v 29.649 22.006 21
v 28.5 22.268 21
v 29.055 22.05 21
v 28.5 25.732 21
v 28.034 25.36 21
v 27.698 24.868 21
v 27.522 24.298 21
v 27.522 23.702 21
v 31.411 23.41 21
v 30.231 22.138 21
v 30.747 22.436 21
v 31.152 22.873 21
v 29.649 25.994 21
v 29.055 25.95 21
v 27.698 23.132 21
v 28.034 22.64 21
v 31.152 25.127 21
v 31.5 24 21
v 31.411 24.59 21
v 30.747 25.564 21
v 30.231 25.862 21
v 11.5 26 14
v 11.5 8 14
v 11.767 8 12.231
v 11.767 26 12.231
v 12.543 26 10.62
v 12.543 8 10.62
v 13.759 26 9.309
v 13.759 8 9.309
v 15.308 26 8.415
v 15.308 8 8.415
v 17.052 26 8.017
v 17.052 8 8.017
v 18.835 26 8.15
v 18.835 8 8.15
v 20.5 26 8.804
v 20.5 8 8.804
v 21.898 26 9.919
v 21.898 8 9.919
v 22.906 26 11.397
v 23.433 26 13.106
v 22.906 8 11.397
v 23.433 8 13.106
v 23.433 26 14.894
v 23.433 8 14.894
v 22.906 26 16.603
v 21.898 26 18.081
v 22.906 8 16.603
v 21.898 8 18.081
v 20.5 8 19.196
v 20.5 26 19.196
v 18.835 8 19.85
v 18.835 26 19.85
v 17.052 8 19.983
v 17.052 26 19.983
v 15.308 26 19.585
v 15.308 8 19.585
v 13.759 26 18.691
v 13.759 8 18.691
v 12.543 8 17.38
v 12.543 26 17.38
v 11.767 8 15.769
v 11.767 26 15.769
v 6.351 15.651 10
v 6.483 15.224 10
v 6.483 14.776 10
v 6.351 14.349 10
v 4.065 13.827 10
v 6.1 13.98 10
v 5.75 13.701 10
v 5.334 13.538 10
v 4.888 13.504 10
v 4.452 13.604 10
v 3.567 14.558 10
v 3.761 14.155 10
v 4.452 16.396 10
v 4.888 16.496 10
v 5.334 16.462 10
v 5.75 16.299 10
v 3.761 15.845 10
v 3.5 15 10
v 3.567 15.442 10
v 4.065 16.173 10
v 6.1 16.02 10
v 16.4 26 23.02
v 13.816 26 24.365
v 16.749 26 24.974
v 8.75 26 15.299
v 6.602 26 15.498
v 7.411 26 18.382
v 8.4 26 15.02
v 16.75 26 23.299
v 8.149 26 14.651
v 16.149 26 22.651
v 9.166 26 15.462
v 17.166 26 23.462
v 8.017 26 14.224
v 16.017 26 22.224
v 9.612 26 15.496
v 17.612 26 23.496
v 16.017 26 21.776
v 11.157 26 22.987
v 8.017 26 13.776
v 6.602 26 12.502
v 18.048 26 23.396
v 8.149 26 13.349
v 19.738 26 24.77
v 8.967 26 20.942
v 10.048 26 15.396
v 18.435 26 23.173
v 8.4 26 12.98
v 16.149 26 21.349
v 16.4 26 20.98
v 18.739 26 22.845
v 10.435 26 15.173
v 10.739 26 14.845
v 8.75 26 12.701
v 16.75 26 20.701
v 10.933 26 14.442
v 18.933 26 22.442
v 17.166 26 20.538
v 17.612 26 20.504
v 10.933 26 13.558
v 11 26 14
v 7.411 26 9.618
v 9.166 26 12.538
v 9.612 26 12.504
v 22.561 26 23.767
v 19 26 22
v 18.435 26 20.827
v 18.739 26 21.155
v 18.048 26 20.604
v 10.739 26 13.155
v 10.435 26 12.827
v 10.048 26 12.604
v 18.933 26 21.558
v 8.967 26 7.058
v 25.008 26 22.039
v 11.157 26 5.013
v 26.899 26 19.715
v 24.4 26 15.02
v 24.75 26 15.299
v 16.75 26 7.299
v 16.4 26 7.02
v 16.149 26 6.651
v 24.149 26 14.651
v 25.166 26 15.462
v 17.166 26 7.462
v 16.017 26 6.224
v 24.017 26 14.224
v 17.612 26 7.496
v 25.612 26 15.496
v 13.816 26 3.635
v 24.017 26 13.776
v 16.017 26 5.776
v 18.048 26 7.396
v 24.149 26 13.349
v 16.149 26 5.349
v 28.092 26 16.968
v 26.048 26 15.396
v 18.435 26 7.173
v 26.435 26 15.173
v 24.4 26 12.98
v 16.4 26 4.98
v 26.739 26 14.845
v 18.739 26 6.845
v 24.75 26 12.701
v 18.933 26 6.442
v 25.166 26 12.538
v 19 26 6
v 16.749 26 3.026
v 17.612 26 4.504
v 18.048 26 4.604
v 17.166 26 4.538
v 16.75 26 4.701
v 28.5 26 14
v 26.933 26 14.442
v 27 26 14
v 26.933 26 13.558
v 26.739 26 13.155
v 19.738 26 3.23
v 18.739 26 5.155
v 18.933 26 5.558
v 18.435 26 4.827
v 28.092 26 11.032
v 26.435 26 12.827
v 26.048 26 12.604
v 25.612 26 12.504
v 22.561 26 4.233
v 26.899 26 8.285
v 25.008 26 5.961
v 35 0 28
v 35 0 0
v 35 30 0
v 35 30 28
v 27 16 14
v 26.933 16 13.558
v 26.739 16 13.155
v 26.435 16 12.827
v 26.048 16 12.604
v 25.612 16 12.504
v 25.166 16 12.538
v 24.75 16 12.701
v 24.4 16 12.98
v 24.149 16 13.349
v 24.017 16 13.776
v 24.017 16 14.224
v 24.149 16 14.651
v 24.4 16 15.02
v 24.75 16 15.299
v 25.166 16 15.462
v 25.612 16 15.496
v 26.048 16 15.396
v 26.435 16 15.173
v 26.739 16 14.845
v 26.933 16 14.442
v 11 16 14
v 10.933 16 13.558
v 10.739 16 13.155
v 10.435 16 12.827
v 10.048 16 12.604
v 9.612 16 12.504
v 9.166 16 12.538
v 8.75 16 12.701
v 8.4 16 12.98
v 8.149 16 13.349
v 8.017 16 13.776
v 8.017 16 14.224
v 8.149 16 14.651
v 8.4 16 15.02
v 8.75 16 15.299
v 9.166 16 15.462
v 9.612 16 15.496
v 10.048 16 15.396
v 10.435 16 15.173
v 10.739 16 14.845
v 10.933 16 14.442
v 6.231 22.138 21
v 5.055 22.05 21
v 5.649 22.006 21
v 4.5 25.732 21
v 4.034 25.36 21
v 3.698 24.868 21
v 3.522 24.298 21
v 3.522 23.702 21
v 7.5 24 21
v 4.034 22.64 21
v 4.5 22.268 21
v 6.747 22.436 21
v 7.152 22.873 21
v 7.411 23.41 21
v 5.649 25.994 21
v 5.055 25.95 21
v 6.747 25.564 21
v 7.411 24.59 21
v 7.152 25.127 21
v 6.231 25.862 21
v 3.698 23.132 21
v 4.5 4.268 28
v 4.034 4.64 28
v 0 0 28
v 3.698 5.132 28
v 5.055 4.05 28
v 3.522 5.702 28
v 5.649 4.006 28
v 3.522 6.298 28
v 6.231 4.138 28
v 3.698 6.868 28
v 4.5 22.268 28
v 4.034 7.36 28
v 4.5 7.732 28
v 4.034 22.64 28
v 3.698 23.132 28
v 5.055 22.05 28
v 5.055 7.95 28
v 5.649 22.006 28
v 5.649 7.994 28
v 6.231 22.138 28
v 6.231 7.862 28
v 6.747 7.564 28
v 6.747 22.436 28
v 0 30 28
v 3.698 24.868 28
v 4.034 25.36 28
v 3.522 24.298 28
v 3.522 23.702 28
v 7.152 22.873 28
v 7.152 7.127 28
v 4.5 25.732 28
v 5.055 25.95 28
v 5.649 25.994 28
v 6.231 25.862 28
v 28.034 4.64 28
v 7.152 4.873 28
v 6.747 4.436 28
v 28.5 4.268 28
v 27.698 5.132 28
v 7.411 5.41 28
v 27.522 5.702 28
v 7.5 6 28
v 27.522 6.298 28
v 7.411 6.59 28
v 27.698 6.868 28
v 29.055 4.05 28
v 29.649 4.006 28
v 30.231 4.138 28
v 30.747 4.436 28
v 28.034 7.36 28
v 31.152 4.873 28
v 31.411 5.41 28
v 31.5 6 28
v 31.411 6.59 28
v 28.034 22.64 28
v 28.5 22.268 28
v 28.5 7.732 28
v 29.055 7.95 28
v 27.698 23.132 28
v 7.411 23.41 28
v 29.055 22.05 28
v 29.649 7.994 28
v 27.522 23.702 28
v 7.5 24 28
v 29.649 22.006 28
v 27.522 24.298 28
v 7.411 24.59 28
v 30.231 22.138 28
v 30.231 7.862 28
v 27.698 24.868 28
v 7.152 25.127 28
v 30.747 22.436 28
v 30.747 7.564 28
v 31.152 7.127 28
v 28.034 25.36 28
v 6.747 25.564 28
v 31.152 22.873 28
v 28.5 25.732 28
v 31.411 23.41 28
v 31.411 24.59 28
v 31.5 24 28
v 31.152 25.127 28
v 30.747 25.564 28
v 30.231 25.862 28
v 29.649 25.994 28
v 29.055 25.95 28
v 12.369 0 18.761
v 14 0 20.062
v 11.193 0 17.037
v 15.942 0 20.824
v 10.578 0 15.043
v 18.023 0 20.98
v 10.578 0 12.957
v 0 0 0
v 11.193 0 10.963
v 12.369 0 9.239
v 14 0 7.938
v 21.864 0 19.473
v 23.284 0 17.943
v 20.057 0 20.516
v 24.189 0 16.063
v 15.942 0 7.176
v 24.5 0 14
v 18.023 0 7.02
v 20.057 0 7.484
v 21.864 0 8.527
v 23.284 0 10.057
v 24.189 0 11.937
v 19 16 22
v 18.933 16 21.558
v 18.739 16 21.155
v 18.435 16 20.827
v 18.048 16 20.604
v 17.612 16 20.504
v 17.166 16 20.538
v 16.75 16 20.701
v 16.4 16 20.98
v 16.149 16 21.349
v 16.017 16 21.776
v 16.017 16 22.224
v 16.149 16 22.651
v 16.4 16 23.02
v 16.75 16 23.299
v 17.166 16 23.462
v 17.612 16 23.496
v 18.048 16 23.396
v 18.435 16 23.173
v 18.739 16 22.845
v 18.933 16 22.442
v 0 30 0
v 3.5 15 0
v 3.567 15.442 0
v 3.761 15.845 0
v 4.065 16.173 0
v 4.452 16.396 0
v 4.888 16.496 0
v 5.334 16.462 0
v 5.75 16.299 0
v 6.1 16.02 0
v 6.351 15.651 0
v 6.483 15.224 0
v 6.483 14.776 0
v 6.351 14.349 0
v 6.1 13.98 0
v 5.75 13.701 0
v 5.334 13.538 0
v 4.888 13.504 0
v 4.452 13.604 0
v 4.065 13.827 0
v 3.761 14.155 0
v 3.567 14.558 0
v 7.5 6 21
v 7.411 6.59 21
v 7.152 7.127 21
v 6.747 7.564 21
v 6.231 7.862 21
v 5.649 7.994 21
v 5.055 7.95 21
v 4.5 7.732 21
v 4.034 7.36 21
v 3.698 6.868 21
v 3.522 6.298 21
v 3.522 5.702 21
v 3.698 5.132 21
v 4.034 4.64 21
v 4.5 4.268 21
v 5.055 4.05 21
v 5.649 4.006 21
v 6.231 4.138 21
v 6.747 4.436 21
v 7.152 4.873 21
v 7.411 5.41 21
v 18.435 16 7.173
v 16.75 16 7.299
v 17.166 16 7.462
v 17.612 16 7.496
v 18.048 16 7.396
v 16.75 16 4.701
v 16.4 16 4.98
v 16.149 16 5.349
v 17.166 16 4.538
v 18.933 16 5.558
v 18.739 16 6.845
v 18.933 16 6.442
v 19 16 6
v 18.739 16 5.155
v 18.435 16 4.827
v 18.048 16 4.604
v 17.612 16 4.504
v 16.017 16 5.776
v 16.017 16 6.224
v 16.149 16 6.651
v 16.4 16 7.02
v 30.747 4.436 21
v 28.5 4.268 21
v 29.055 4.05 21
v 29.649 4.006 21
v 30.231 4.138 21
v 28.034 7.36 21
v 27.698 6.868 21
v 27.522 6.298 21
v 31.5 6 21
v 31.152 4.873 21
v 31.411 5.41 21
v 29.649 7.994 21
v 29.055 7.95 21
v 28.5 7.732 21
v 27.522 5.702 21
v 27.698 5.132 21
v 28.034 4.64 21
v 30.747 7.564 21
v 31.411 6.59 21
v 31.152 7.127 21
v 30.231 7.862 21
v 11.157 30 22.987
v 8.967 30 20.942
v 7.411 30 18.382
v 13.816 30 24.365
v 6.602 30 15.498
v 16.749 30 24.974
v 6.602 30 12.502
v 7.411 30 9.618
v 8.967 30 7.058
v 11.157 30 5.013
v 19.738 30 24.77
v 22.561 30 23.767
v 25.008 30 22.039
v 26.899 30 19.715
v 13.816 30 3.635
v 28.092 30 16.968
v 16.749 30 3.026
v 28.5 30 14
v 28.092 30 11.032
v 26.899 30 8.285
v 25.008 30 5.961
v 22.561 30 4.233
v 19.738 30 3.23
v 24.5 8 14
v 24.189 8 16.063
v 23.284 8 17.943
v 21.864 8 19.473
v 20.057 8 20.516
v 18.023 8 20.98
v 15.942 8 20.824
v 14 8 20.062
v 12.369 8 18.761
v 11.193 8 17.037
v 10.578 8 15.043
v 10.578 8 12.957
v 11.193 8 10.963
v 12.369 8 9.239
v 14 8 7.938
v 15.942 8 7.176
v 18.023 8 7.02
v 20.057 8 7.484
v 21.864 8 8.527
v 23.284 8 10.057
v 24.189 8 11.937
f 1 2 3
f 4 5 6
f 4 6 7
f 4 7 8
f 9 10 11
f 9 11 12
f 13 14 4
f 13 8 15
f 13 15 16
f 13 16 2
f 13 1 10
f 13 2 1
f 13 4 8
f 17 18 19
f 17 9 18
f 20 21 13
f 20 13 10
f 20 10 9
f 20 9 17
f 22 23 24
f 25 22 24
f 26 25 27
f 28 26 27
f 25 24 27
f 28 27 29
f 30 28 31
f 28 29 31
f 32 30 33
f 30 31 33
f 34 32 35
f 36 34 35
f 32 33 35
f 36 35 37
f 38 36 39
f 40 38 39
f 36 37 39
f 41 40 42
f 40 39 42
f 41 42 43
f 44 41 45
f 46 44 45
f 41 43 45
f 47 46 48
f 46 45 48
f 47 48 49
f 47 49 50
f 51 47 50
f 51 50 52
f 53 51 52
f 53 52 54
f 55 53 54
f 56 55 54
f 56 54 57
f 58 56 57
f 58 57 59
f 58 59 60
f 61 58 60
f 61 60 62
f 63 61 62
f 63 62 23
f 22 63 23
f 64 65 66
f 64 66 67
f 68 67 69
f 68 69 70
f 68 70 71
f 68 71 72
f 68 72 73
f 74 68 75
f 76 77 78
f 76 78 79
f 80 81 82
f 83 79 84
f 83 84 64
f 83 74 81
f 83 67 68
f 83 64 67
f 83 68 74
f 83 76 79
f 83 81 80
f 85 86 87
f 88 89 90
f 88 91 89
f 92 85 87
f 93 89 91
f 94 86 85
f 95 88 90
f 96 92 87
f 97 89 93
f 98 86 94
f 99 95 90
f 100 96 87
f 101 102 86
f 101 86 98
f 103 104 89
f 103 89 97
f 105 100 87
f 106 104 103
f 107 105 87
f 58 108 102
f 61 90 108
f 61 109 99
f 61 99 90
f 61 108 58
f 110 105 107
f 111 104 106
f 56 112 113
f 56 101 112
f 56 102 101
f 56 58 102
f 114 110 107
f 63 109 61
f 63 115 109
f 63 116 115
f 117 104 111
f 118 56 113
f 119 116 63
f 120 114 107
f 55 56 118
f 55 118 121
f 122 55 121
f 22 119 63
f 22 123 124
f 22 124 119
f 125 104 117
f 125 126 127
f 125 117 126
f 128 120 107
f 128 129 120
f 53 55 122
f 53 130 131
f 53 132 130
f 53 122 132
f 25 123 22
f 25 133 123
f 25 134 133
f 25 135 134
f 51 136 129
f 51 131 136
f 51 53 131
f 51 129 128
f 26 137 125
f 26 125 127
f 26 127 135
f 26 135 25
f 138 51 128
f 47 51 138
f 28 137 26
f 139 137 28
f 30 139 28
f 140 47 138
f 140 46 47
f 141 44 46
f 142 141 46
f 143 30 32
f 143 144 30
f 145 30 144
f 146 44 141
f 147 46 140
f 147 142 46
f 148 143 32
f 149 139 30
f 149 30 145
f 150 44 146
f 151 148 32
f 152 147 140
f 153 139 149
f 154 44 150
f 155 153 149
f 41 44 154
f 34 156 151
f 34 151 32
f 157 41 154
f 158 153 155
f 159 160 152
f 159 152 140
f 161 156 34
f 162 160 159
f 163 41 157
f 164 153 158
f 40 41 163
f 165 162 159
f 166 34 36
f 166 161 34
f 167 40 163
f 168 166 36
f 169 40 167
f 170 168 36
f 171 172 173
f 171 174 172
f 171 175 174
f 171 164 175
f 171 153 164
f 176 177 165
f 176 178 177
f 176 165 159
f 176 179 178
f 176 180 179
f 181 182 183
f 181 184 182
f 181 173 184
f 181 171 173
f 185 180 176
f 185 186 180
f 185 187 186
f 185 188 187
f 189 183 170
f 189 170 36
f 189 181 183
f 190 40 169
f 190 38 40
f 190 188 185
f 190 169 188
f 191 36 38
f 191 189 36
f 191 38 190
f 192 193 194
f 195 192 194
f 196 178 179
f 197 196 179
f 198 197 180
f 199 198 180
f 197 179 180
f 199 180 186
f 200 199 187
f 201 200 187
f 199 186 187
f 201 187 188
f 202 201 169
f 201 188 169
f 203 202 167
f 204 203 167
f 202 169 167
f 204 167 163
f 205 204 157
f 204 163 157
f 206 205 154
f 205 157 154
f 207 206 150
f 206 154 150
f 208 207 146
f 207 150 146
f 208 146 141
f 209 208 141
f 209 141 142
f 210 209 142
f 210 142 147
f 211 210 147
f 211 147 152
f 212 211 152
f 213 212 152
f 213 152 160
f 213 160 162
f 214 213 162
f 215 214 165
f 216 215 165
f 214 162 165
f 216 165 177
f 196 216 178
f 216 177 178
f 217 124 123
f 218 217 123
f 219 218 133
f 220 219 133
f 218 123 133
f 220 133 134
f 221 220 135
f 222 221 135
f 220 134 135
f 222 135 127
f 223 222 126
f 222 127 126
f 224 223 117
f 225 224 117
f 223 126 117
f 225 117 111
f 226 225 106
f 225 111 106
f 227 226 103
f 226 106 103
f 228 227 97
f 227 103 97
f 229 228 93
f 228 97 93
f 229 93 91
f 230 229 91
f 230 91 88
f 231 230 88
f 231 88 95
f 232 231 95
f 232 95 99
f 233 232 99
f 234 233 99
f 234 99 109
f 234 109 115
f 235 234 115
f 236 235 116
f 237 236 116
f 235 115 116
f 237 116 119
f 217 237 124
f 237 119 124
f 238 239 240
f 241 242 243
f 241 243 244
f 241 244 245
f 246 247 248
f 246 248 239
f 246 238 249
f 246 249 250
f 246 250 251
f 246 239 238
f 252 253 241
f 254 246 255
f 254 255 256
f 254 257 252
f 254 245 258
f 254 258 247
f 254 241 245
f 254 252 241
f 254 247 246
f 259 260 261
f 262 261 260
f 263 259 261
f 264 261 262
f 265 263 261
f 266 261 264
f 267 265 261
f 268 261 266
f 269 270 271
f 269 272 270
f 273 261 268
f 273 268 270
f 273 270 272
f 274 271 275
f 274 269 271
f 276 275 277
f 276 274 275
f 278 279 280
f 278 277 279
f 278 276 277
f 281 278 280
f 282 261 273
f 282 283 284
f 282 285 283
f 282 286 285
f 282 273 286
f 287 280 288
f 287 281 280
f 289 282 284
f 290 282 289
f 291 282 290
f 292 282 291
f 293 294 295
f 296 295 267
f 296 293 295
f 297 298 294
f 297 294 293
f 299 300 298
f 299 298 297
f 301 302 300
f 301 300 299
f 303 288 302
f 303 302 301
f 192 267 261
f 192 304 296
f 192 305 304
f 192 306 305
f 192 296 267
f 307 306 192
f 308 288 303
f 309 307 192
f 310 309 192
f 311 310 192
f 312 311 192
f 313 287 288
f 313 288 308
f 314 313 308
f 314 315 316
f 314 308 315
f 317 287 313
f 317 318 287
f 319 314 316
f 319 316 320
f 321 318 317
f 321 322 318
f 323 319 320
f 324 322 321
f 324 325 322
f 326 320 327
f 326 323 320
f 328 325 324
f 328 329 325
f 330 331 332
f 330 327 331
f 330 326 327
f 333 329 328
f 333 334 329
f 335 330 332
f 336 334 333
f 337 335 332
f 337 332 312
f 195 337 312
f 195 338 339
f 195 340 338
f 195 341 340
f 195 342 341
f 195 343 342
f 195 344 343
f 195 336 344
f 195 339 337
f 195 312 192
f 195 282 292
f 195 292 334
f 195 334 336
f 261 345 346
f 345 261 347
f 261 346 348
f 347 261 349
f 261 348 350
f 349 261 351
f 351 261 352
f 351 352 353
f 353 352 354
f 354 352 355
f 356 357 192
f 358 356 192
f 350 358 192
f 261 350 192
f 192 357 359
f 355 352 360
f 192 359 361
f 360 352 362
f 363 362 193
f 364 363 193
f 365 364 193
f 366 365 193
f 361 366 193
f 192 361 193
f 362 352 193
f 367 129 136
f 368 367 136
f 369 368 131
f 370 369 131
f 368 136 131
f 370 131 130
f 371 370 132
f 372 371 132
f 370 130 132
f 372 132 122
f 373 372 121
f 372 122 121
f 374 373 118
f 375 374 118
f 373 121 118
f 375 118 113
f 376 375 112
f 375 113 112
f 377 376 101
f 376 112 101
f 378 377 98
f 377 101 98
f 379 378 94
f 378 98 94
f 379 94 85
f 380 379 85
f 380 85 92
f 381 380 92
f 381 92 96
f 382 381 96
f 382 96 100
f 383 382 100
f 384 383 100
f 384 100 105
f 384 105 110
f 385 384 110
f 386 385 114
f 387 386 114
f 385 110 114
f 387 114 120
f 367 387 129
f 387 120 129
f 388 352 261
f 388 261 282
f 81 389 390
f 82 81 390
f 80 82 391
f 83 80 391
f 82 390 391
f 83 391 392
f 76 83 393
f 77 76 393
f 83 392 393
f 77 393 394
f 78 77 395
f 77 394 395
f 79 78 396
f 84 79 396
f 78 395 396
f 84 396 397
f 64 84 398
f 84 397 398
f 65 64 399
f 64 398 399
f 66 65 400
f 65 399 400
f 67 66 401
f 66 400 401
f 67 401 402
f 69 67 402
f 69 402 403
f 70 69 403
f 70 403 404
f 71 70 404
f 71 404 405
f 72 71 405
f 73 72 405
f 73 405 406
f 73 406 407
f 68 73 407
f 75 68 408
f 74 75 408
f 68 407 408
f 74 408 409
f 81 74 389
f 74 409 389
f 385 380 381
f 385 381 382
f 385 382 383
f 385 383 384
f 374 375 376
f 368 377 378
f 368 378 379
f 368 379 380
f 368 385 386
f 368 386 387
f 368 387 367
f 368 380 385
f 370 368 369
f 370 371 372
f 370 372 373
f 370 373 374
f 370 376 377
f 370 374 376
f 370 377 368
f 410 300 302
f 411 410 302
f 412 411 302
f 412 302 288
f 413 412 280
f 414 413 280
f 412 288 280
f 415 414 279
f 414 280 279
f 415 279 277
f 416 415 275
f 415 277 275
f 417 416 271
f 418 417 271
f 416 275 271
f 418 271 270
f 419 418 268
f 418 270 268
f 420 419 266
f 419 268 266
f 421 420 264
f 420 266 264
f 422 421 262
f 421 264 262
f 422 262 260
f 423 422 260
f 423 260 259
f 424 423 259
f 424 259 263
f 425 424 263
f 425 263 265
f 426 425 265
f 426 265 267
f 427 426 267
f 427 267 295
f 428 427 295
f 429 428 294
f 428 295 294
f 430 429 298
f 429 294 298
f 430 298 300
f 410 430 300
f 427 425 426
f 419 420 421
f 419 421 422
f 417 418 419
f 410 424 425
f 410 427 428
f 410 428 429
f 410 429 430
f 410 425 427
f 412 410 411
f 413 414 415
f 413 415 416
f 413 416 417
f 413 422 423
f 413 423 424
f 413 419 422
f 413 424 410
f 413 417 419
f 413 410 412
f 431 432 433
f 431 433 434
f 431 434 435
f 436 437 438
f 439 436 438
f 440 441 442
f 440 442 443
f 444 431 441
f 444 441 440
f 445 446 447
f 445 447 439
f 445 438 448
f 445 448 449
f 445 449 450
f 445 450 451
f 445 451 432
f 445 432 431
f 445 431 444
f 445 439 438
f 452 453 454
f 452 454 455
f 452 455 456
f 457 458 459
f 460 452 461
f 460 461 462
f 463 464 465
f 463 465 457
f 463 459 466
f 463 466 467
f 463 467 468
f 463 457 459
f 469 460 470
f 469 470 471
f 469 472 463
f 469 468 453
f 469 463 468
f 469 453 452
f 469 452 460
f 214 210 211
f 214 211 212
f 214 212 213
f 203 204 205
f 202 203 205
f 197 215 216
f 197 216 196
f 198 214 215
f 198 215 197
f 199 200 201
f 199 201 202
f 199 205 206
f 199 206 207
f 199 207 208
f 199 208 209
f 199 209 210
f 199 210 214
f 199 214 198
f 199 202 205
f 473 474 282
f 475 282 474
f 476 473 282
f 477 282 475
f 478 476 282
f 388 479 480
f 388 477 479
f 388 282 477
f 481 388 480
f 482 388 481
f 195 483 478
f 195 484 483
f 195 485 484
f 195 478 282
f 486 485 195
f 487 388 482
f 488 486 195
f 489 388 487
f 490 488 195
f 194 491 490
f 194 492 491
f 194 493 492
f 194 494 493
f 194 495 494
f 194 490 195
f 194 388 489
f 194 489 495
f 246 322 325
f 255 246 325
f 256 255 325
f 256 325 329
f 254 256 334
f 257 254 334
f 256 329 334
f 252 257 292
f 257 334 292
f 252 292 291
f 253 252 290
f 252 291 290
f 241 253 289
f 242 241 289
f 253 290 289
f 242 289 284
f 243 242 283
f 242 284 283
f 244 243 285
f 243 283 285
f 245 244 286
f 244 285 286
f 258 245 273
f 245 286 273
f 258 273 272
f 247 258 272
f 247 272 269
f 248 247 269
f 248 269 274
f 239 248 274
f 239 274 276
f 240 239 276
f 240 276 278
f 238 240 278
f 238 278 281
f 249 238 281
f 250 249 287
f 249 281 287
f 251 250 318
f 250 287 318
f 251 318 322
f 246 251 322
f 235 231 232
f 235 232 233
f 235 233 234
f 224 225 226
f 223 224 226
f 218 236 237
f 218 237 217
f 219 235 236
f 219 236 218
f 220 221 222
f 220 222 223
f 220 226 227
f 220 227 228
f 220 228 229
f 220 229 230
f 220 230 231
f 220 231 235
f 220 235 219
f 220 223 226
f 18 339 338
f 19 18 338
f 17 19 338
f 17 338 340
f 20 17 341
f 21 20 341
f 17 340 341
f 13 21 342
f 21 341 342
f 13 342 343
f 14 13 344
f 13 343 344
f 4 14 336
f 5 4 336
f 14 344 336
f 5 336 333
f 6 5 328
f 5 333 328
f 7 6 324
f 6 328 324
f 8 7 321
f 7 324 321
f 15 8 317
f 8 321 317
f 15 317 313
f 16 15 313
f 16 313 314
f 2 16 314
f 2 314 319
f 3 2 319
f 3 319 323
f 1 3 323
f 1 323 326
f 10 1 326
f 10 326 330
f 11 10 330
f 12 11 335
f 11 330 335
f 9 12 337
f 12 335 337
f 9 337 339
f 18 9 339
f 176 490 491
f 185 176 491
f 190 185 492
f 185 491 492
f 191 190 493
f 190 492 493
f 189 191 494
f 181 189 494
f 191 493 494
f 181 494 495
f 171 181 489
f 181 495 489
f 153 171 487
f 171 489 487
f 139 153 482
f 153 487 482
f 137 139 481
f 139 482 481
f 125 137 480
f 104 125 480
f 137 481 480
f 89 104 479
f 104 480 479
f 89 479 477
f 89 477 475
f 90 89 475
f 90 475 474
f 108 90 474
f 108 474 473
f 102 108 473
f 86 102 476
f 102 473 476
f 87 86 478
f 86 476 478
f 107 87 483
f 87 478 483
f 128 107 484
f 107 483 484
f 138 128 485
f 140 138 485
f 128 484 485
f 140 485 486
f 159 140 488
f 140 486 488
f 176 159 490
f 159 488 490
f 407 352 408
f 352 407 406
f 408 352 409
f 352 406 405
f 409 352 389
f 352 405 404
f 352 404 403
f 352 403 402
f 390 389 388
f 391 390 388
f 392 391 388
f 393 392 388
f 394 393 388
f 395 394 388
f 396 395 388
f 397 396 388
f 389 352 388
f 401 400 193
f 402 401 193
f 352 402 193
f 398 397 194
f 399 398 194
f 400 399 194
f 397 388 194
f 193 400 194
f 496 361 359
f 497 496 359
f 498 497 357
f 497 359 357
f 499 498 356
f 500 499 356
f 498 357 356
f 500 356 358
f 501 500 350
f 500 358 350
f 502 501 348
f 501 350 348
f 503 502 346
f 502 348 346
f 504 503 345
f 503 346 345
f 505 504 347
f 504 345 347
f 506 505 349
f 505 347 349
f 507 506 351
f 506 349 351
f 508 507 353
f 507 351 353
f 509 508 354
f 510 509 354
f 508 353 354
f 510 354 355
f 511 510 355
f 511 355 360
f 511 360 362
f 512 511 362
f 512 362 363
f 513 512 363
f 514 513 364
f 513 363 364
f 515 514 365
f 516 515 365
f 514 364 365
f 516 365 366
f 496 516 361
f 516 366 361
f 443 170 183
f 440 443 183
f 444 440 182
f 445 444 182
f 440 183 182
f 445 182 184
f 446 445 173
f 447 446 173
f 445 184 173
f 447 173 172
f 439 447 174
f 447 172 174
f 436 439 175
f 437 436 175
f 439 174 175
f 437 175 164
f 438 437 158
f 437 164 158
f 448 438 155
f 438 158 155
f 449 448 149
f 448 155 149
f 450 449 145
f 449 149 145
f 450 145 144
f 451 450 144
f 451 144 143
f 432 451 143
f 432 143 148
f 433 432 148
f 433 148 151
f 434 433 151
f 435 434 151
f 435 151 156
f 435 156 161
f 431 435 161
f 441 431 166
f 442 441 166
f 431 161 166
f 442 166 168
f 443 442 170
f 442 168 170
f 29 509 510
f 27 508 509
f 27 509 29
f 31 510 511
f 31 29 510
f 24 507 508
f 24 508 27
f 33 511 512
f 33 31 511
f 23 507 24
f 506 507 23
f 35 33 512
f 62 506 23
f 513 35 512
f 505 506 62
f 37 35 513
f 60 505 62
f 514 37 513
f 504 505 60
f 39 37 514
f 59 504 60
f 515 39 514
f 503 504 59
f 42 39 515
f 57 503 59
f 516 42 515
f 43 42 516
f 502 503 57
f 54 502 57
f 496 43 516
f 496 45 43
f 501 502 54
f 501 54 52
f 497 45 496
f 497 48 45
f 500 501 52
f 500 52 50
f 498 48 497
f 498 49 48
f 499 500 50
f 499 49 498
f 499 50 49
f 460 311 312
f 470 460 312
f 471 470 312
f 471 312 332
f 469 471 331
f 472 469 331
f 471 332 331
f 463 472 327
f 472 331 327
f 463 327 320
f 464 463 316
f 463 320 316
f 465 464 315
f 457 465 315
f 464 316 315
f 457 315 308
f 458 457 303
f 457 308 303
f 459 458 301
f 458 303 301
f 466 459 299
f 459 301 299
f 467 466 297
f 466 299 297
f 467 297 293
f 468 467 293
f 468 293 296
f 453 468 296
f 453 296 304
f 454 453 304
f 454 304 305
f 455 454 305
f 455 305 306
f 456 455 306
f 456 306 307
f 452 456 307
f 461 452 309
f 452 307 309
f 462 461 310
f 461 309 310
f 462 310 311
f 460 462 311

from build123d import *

# Parameters (mm, degrees)
SKETCH1_W           = 35
SKETCH1_H           = 30
BOSS_EXTRUDE1_DEPTH = 28
SKETCH2_R           = 2
CUT_EXTRUDE1_DEPTH  = 7
SKETCH4_R           = 7
CUT_EXTRUDE2_DEPTH  = 8
SKETCH5_R           = 6
CUT_EXTRUDE3_DEPTH  = 50
SKETCH6_R           = 11
CUT_EXTRUDE4_DEPTH  = 4
SKETCH7_R           = 1.5
CUT_EXTRUDE5_DEPTH  = 10
SKETCH8_R           = 1.5
CUT_EXTRUDE6_DEPTH  = 10


with BuildPart() as part:
    # Sketch1 → Boss-Extrude1 (new body)
    with BuildSketch(Plane.XY):
        with Locations((17.5, 15)):
            Rectangle(SKETCH1_W, SKETCH1_H)
    extrude(amount=BOSS_EXTRUDE1_DEPTH)

    # Sketch2 → Cut-Extrude1 (cut)
    with BuildSketch(Plane.XY.offset(28)):
        with Locations((5.5, 24)):
            Circle(SKETCH2_R)
        with Locations((5.5, 6)):
            Circle(SKETCH2_R)
        with Locations((29.5, 6)):
            Circle(SKETCH2_R)
        with Locations((29.5, 24)):
            Circle(SKETCH2_R)
    extrude(amount=-CUT_EXTRUDE1_DEPTH, mode=Mode.SUBTRACT)

    # Sketch4 → Cut-Extrude2 (cut)
    with BuildSketch(Plane.XZ):
        with Locations((17.5, 14)):
            Circle(SKETCH4_R)
    extrude(amount=-CUT_EXTRUDE2_DEPTH, mode=Mode.SUBTRACT)

    # Sketch5 → Cut-Extrude3 (cut)
    with BuildSketch(Plane(origin=(0, 8, 0), x_dir=(-1, 0, 0), z_dir=(0, -1, 0))):
        with Locations((-17.5, -14)):
            Circle(SKETCH5_R)
    extrude(amount=-CUT_EXTRUDE3_DEPTH, mode=Mode.SUBTRACT)

    # Sketch6 → Cut-Extrude4 (cut)
    with BuildSketch(Plane(origin=(0, 30, 0), x_dir=(1, 0, 0), z_dir=(0, 1, 0))):
        with Locations((17.5, -14)):
            Circle(SKETCH6_R)
    extrude(amount=-CUT_EXTRUDE4_DEPTH, mode=Mode.SUBTRACT)

    # Sketch7 → Cut-Extrude5 (cut)
    with BuildSketch(Plane(origin=(0, 26, 0), x_dir=(1, 0, 0), z_dir=(0, 1, 0))):
        with Locations((17.5, -6)):
            Circle(SKETCH7_R)
        with Locations((9.5, -14)):
            Circle(SKETCH7_R)
        with Locations((17.5, -22)):
            Circle(SKETCH7_R)
        with Locations((25.5, -14)):
            Circle(SKETCH7_R)
    extrude(amount=-CUT_EXTRUDE5_DEPTH, mode=Mode.SUBTRACT)

    # Sketch8 → Cut-Extrude6 (cut)
    with BuildSketch(Plane(origin=(0, 0, 0), x_dir=(-1, 0, 0), z_dir=(0, 0, -1))):
        with Locations((-5, 15)):
            Circle(SKETCH8_R)
    extrude(amount=-CUT_EXTRUDE6_DEPTH, mode=Mode.SUBTRACT)


solid = part.part
